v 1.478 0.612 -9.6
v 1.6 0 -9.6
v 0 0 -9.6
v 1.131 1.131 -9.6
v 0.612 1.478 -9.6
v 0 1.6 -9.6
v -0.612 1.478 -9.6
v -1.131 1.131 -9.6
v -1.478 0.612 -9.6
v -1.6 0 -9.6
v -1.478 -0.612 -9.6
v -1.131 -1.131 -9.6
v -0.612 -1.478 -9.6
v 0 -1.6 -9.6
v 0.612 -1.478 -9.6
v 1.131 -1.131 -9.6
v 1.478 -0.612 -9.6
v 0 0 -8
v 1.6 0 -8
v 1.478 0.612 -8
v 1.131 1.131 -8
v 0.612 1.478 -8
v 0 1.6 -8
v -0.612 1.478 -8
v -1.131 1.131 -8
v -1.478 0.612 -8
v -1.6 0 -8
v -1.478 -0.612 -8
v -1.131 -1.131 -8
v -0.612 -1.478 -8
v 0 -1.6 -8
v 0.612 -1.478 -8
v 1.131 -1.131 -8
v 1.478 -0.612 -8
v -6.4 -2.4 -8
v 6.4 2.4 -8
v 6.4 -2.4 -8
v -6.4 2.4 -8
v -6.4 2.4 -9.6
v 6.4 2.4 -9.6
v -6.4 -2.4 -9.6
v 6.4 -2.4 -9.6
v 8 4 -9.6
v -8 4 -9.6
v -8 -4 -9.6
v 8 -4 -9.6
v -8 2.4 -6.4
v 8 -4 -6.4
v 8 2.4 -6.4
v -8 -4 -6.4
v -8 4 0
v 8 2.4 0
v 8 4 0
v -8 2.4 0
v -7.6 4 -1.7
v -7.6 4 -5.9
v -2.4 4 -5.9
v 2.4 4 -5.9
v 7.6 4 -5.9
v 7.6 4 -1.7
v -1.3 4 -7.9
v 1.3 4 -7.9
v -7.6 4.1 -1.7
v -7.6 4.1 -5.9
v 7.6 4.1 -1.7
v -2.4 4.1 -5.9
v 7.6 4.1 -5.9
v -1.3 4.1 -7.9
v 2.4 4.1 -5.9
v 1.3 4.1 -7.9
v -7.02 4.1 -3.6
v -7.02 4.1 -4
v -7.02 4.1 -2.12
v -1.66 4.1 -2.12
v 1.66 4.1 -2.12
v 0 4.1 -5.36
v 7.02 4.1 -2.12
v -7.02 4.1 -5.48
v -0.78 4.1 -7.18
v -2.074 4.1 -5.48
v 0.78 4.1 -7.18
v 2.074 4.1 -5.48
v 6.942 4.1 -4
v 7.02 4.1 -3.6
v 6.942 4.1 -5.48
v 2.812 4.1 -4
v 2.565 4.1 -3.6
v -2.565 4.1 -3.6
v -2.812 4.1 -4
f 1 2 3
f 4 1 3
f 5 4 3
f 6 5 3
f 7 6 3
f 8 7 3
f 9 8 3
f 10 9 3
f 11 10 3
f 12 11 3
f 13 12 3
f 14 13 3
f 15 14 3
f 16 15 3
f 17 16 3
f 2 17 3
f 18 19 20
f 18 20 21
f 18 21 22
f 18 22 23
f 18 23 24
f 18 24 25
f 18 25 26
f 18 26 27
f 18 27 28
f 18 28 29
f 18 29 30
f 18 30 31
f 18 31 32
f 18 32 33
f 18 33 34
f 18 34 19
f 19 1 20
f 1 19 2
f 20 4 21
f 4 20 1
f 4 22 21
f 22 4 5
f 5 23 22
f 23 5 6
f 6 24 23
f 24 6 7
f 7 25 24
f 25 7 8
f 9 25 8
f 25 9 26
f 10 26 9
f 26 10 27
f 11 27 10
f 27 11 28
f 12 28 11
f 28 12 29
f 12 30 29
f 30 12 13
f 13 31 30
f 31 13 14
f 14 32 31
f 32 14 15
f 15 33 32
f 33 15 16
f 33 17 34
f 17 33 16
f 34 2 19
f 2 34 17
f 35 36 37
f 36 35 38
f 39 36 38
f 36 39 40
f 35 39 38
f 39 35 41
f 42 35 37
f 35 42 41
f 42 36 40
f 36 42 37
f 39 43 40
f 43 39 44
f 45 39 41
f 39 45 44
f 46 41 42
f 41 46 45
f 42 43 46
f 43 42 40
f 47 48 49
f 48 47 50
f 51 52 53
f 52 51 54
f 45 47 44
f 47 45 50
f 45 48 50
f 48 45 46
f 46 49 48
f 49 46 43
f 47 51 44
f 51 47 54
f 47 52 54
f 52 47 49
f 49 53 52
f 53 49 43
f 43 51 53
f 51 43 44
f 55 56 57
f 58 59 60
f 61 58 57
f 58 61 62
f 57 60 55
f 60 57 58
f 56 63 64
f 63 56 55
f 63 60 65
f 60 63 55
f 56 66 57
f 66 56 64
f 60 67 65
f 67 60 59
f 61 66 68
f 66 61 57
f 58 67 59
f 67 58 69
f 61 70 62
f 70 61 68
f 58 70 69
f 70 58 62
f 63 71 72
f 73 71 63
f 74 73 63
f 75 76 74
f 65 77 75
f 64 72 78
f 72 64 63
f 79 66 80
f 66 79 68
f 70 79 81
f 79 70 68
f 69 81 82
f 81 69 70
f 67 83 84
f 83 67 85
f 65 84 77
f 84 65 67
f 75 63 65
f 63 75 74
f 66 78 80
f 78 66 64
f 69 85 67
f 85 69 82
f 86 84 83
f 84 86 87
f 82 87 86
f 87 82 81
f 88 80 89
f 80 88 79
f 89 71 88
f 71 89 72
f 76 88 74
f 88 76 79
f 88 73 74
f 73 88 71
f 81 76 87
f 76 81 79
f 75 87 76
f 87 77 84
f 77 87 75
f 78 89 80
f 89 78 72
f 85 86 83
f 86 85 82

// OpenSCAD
// file: ../p/4-4edge.scad
use <../lib.scad>
function ldraw_lib__4_4edge() = [
// 0 Circle 1.0
// 0 Name: 4-4edge.dat
// 0 Author: James Jessiman
// 0 !LDRAW_ORG Primitive UPDATE 2017-01
// 0 !LICENSE Licensed under CC BY 2.0 and CC BY 4.0 : see CAreadme.txt
// 
// 0 BFC CERTIFY CCW
  [0,"BFC","CERTIFY"],
  [0,"BFC","CCW"],
// 
// 0 !HISTORY 1998-12-15 [PTadmin] Official Update 1998-10
// 0 !HISTORY 2005-12-28 [PTadmin] Official Update 2005-01
// 0 !HISTORY 2007-06-24 [PTadmin] Header formatted for Contributor Agreement
// 0 !HISTORY 2008-07-01 [PTadmin] Official Update 2008-01
// 0 !HISTORY 2017-01-15 [Steffen] BFCed
// 0 !HISTORY 2017-12-30 [PTadmin] Official Update 2017-01
// 
// 
// 2 24 1 0 0 0.9239 0 0.3827
  [2,24,1,0,0,0.9239,0,0.3827],
// 2 24 0.9239 0 0.3827 0.7071 0 0.7071
  [2,24,0.9239,0,0.3827,0.7071,0,0.7071],
// 2 24 0.7071 0 0.7071 0.3827 0 0.9239
  [2,24,0.7071,0,0.7071,0.3827,0,0.9239],
// 2 24 0.3827 0 0.9239 0 0 1
  [2,24,0.3827,0,0.9239,0,0,1],
// 2 24 0 0 1 -0.3827 0 0.9239
  [2,24,0,0,1,-0.3827,0,0.9239],
// 2 24 -0.3827 0 0.9239 -0.7071 0 0.7071
  [2,24,-0.3827,0,0.9239,-0.7071,0,0.7071],
// 2 24 -0.7071 0 0.7071 -0.9239 0 0.3827
  [2,24,-0.7071,0,0.7071,-0.9239,0,0.3827],
// 2 24 -0.9239 0 0.3827 -1 0 -0
  [2,24,-0.9239,0,0.3827,-1,0,-0],
// 2 24 -1 0 -0 -0.9239 0 -0.3827
  [2,24,-1,0,-0,-0.9239,0,-0.3827],
// 2 24 -0.9239 0 -0.3827 -0.7071 0 -0.7071
  [2,24,-0.9239,0,-0.3827,-0.7071,0,-0.7071],
// 2 24 -0.7071 0 -0.7071 -0.3827 0 -0.9239
  [2,24,-0.7071,0,-0.7071,-0.3827,0,-0.9239],
// 2 24 -0.3827 0 -0.9239 0 0 -1
  [2,24,-0.3827,0,-0.9239,0,0,-1],
// 2 24 0 0 -1 0.3827 0 -0.9239
  [2,24,0,0,-1,0.3827,0,-0.9239],
// 2 24 0.3827 0 -0.9239 0.7071 0 -0.7071
  [2,24,0.3827,0,-0.9239,0.7071,0,-0.7071],
// 2 24 0.7071 0 -0.7071 0.9239 0 -0.3827
  [2,24,0.7071,0,-0.7071,0.9239,0,-0.3827],
// 2 24 0.9239 0 -0.3827 1 0 0
  [2,24,0.9239,0,-0.3827,1,0,0],
];
module ldraw_lib__4_4edge(step=0, col=false, unit=2/5, alt=false, line=0.2, solid=!$preview)
    makepoly(ldraw_lib__4_4edge(), step=step, col=col, unit=unit, alt=alt, line=line, solid=solid);
ldraw_lib__4_4edge(line=0.2);
// file: ../p/4-4disc.scad
use <../lib.scad>
function ldraw_lib__4_4disc() = [
// 0 Disc 1.0
// 0 Name: 4-4disc.dat
// 0 Author: James Jessiman
// 0 !LDRAW_ORG Primitive UPDATE 2002-02
// 0 !LICENSE Licensed under CC BY 2.0 and CC BY 4.0 : see CAreadme.txt
// 
// 0 BFC CERTIFY CCW
  [0,"BFC","CERTIFY"],
  [0,"BFC","CCW"],
// 
// 0 !HISTORY 1998-12-15 [PTadmin] Official Update 1998-10
// 0 !HISTORY 2002-03-23 [sbliss] Added BFC statement
// 0 !HISTORY 2002-04-25 [PTadmin] Official Update 2002-02
// 0 !HISTORY 2007-06-24 [PTadmin] Header formatted for Contributor Agreement
// 0 !HISTORY 2008-07-01 [PTadmin] Official Update 2008-01
// 
// 
// 3 16 0 0 0 1 0 0 0.9239 0 0.3827
  [3,16,0,0,0,1,0,0,0.9239,0,0.3827],
// 3 16 0 0 0 0.9239 0 0.3827 0.7071 0 0.7071
  [3,16,0,0,0,0.9239,0,0.3827,0.7071,0,0.7071],
// 3 16 0 0 0 0.7071 0 0.7071 0.3827 0 0.9239
  [3,16,0,0,0,0.7071,0,0.7071,0.3827,0,0.9239],
// 3 16 0 0 0 0.3827 0 0.9239 0 0 1
  [3,16,0,0,0,0.3827,0,0.9239,0,0,1],
// 3 16 0 0 0 0 0 1 -0.3827 0 0.9239
  [3,16,0,0,0,0,0,1,-0.3827,0,0.9239],
// 3 16 0 0 0 -0.3827 0 0.9239 -0.7071 0 0.7071
  [3,16,0,0,0,-0.3827,0,0.9239,-0.7071,0,0.7071],
// 3 16 0 0 0 -0.7071 0 0.7071 -0.9239 0 0.3827
  [3,16,0,0,0,-0.7071,0,0.7071,-0.9239,0,0.3827],
// 3 16 0 0 0 -0.9239 0 0.3827 -1 0 -0
  [3,16,0,0,0,-0.9239,0,0.3827,-1,0,-0],
// 3 16 0 0 0 -1 0 -0 -0.9239 0 -0.3827
  [3,16,0,0,0,-1,0,-0,-0.9239,0,-0.3827],
// 3 16 0 0 0 -0.9239 0 -0.3827 -0.7071 0 -0.7071
  [3,16,0,0,0,-0.9239,0,-0.3827,-0.7071,0,-0.7071],
// 3 16 0 0 0 -0.7071 0 -0.7071 -0.3827 0 -0.9239
  [3,16,0,0,0,-0.7071,0,-0.7071,-0.3827,0,-0.9239],
// 3 16 0 0 0 -0.3827 0 -0.9239 0 0 -1
  [3,16,0,0,0,-0.3827,0,-0.9239,0,0,-1],
// 3 16 0 0 0 0 0 -1 0.3827 0 -0.9239
  [3,16,0,0,0,0,0,-1,0.3827,0,-0.9239],
// 3 16 0 0 0 0.3827 0 -0.9239 0.7071 0 -0.7071
  [3,16,0,0,0,0.3827,0,-0.9239,0.7071,0,-0.7071],
// 3 16 0 0 0 0.7071 0 -0.7071 0.9239 0 -0.3827
  [3,16,0,0,0,0.7071,0,-0.7071,0.9239,0,-0.3827],
// 3 16 0 0 0 0.9239 0 -0.3827 1 0 0
  [3,16,0,0,0,0.9239,0,-0.3827,1,0,0],
// 0
];
module ldraw_lib__4_4disc(step=0, col=false, unit=2/5, alt=false, line=0.2, solid=!$preview)
    makepoly(ldraw_lib__4_4disc(), step=step, col=col, unit=unit, alt=alt, line=line, solid=solid);
ldraw_lib__4_4disc(line=0.2);
// file: ../p/4-4cyli.scad
use <../lib.scad>
$fa=1; $fs=0.2;
function ldraw_lib__4_4cyli(realsolid=false) = [
// 0 Cylinder 1.0
// 0 Name: 4-4cyli.dat
// 0 Author: James Jessiman
// 0 !LDRAW_ORG Primitive UPDATE 2005-01
// 0 !LICENSE Licensed under CC BY 2.0 and CC BY 4.0 : see CAreadme.txt
// 
// 0 BFC CERTIFY CCW
  [0,"BFC","CERTIFY"],
  [0,"BFC","CCW"],
// 
// 0 !HISTORY 1998-12-15 [PTadmin] Official Update 1998-10
// 0 !HISTORY 2002-03-23 [sbliss] Added BFC statement; merged headers from files in distributions LDraw 0.27 and Complete.
// 0 !HISTORY 2002-04-25 [PTadmin] Official Update 2002-02
// 0 !HISTORY 2004-12-14 [guyvivan] BFC CCW
// 0 !HISTORY 2005-12-28 [PTadmin] Official Update 2005-01
// 0 !HISTORY 2007-06-24 [PTadmin] Header formatted for Contributor Agreement
// 0 !HISTORY 2008-07-01 [PTadmin] Official Update 2008-01
// 
// 
// 4 16 1 1 0 0.9239 1 0.3827 0.9239 0 0.3827 1 0 0
  [4,16,1,1,0,0.9239,1,0.3827,0.9239,0,0.3827,1,0,0],
// 5 24 1 0 0 1 1 0 0.9239 0 0.3827 0.9239 0 -0.3827
  [5,24,1,0,0,1,1,0,0.9239,0,0.3827,0.9239,0,-0.3827],
// 4 16 0.9239 1 0.3827 0.7071 1 0.7071 0.7071 0 0.7071 0.9239 0 0.3827
  [4,16,0.9239,1,0.3827,0.7071,1,0.7071,0.7071,0,0.7071,0.9239,0,0.3827],
// 5 24 0.9239 0 0.3827 0.9239 1 0.3827 0.7071 0 0.7071 1 0 0
  [5,24,0.9239,0,0.3827,0.9239,1,0.3827,0.7071,0,0.7071,1,0,0],
// 4 16 0.7071 1 0.7071 0.3827 1 0.9239 0.3827 0 0.9239 0.7071 0 0.7071
  [4,16,0.7071,1,0.7071,0.3827,1,0.9239,0.3827,0,0.9239,0.7071,0,0.7071],
// 5 24 0.7071 0 0.7071 0.7071 1 0.7071 0.3827 0 0.9239 0.9239 0 0.3827
  [5,24,0.7071,0,0.7071,0.7071,1,0.7071,0.3827,0,0.9239,0.9239,0,0.3827],
// 4 16 0.3827 1 0.9239 0 1 1 0 0 1 0.3827 0 0.9239
  [4,16,0.3827,1,0.9239,0,1,1,0,0,1,0.3827,0,0.9239],
// 5 24 0.3827 0 0.9239 0.3827 1 0.9239 0 0 1 0.7071 0 0.7071
  [5,24,0.3827,0,0.9239,0.3827,1,0.9239,0,0,1,0.7071,0,0.7071],
// 4 16 0 1 1 -0.3827 1 0.9239 -0.3827 0 0.9239 0 0 1
  [4,16,0,1,1,-0.3827,1,0.9239,-0.3827,0,0.9239,0,0,1],
// 5 24 0 0 1 0 1 1 -0.3827 0 0.9239 0.3827 0 0.9239
  [5,24,0,0,1,0,1,1,-0.3827,0,0.9239,0.3827,0,0.9239],
// 4 16 -0.3827 1 0.9239 -0.7071 1 0.7071 -0.7071 0 0.7071 -0.3827 0 0.9239
  [4,16,-0.3827,1,0.9239,-0.7071,1,0.7071,-0.7071,0,0.7071,-0.3827,0,0.9239],
// 5 24 -0.3827 0 0.9239 -0.3827 1 0.9239 -0.7071 0 0.7071 0 0 1
  [5,24,-0.3827,0,0.9239,-0.3827,1,0.9239,-0.7071,0,0.7071,0,0,1],
// 4 16 -0.7071 1 0.7071 -0.9239 1 0.3827 -0.9239 0 0.3827 -0.7071 0 0.7071
  [4,16,-0.7071,1,0.7071,-0.9239,1,0.3827,-0.9239,0,0.3827,-0.7071,0,0.7071],
// 5 24 -0.7071 0 0.7071 -0.7071 1 0.7071 -0.9239 0 0.3827 -0.3827 0 0.9239
  [5,24,-0.7071,0,0.7071,-0.7071,1,0.7071,-0.9239,0,0.3827,-0.3827,0,0.9239],
// 4 16 -0.9239 1 0.3827 -1 1 0 -1 0 0 -0.9239 0 0.3827
  [4,16,-0.9239,1,0.3827,-1,1,0,-1,0,0,-0.9239,0,0.3827],
// 5 24 -0.9239 0 0.3827 -0.9239 1 0.3827 -1 0 0 -0.7071 0 0.7071
  [5,24,-0.9239,0,0.3827,-0.9239,1,0.3827,-1,0,0,-0.7071,0,0.7071],
// 4 16 -1 1 0 -0.9239 1 -0.3827 -0.9239 0 -0.3827 -1 0 0
  [4,16,-1,1,0,-0.9239,1,-0.3827,-0.9239,0,-0.3827,-1,0,0],
// 5 24 -1 0 0 -1 1 0 -0.9239 0 -0.3827 -0.9239 0 0.3827
  [5,24,-1,0,0,-1,1,0,-0.9239,0,-0.3827,-0.9239,0,0.3827],
// 4 16 -0.9239 1 -0.3827 -0.7071 1 -0.7071 -0.7071 0 -0.7071 -0.9239 0 -0.3827
  [4,16,-0.9239,1,-0.3827,-0.7071,1,-0.7071,-0.7071,0,-0.7071,-0.9239,0,-0.3827],
// 5 24 -0.9239 0 -0.3827 -0.9239 1 -0.3827 -0.7071 0 -0.7071 -1 0 0
  [5,24,-0.9239,0,-0.3827,-0.9239,1,-0.3827,-0.7071,0,-0.7071,-1,0,0],
// 4 16 -0.7071 1 -0.7071 -0.3827 1 -0.9239 -0.3827 0 -0.9239 -0.7071 0 -0.7071
  [4,16,-0.7071,1,-0.7071,-0.3827,1,-0.9239,-0.3827,0,-0.9239,-0.7071,0,-0.7071],
// 5 24 -0.7071 0 -0.7071 -0.7071 1 -0.7071 -0.3827 0 -0.9239 -0.9239 0 -0.3827
  [5,24,-0.7071,0,-0.7071,-0.7071,1,-0.7071,-0.3827,0,-0.9239,-0.9239,0,-0.3827],
// 4 16 -0.3827 1 -0.9239 0 1 -1 0 0 -1 -0.3827 0 -0.9239
  [4,16,-0.3827,1,-0.9239,0,1,-1,0,0,-1,-0.3827,0,-0.9239],
// 5 24 -0.3827 0 -0.9239 -0.3827 1 -0.9239 0 0 -1 -0.7071 0 -0.7071
  [5,24,-0.3827,0,-0.9239,-0.3827,1,-0.9239,0,0,-1,-0.7071,0,-0.7071],
// 4 16 0 1 -1 0.3827 1 -0.9239 0.3827 0 -0.9239 0 0 -1
  [4,16,0,1,-1,0.3827,1,-0.9239,0.3827,0,-0.9239,0,0,-1],
// 5 24 0 0 -1 0 1 -1 0.3827 0 -0.9239 -0.3827 0 -0.9239
  [5,24,0,0,-1,0,1,-1,0.3827,0,-0.9239,-0.3827,0,-0.9239],
// 4 16 0.3827 1 -0.9239 0.7071 1 -0.7071 0.7071 0 -0.7071 0.3827 0 -0.9239
  [4,16,0.3827,1,-0.9239,0.7071,1,-0.7071,0.7071,0,-0.7071,0.3827,0,-0.9239],
// 5 24 0.3827 0 -0.9239 0.3827 1 -0.9239 0.7071 0 -0.7071 0 0 -1
  [5,24,0.3827,0,-0.9239,0.3827,1,-0.9239,0.7071,0,-0.7071,0,0,-1],
// 4 16 0.7071 1 -0.7071 0.9239 1 -0.3827 0.9239 0 -0.3827 0.7071 0 -0.7071
  [4,16,0.7071,1,-0.7071,0.9239,1,-0.3827,0.9239,0,-0.3827,0.7071,0,-0.7071],
// 5 24 0.7071 0 -0.7071 0.7071 1 -0.7071 0.9239 0 -0.3827 0.3827 0 -0.9239
  [5,24,0.7071,0,-0.7071,0.7071,1,-0.7071,0.9239,0,-0.3827,0.3827,0,-0.9239],
// 4 16 0.9239 1 -0.3827 1 1 0 1 0 0 0.9239 0 -0.3827
  [4,16,0.9239,1,-0.3827,1,1,0,1,0,0,0.9239,0,-0.3827],
// 5 24 0.9239 0 -0.3827 0.9239 1 -0.3827 1 0 0 0.7071 0 -0.7071
  [5,24,0.9239,0,-0.3827,0.9239,1,-0.3827,1,0,0,0.7071,0,-0.7071],
// 0
];
module ldraw_lib__4_4cyli(step=0, col=false, unit=2/5, alt=false, line=0.2, solid=!$preview)
    makepoly(ldraw_lib__4_4cyli(solid), step=step, col=col, unit=unit, alt=alt, line=line, solid=solid);
ldraw_lib__4_4cyli(line=0.2);
// file: ../p/stud3.scad
use <../lib.scad>
use <4-4cyli.scad>
use <4-4disc.scad>
use <4-4edge.scad>
function ldraw_lib__stud3() = [
// 0 Stud Tube Solid
// 0 Name: stud3.dat
// 0 Author: James Jessiman
// 0 !LDRAW_ORG Primitive UPDATE 2012-01
// 0 !LICENSE Licensed under CC BY 4.0 : see CAreadme.txt
// 
// 0 BFC CERTIFY CCW
  [0,"BFC","CERTIFY"],
  [0,"BFC","CCW"],
// 
// 0 !HISTORY 2002-04-04 [sbliss] Modified for BFC compliance
// 0 !HISTORY 2002-04-25 [PTadmin] Official Update 2002-02
// 0 !HISTORY 2007-06-24 [PTadmin] Header formatted for Contributor Agreement
// 0 !HISTORY 2008-07-01 [PTadmin] Official Update 2008-01
// 0 !HISTORY 2012-02-16 [Philo] Changed to CCW
// 0 !HISTORY 2012-03-30 [PTadmin] Official Update 2012-01
// 
// 
// 1 16 0 -4 0 4 0 0 0 1 0 0 0 4 4-4edge.dat
  [1,16,0,-4,0,4,0,0,0,1,0,0,0,4, ldraw_lib__4_4edge()],
// 1 16 0 0 0 4 0 0 0 1 0 0 0 4 4-4edge.dat
  [1,16,0,0,0,4,0,0,0,1,0,0,0,4, ldraw_lib__4_4edge()],
// 1 16 0 -4 0 4 0 0 0 1 0 0 0 4 4-4disc.dat
  [1,16,0,-4,0,4,0,0,0,1,0,0,0,4, ldraw_lib__4_4disc()],
  [-1,16,0,0,0,4,0,0,0,-1,0,0,0,4, ldraw_lib__4_4disc()],
// 1 16 0 -4 0 4 0 0 0 4 0 0 0 4 4-4cyli.dat
  [1,16,0,-4,0,4,0,0,0,4,0,0,0,4, ldraw_lib__4_4cyli()],
];
module ldraw_lib__stud3(step=0, col=false, unit=2/5, alt=false, line=0.2, solid=!$preview)
    makepoly(ldraw_lib__stud3(), step=step, col=col, unit=unit, alt=alt, line=line, solid=solid);
ldraw_lib__stud3(line=0.2);
// file: ../p/box5.scad
use <../lib.scad>
function ldraw_lib__box5() = [
// 0 Box with 5 Faces and All Edges
// 0 Name: box5.dat
// 0 Author: James Jessiman
// 0 !LDRAW_ORG Primitive UPDATE 2012-01
// 0 !LICENSE Licensed under CC BY 2.0 and CC BY 4.0 : see CAreadme.txt
// 
// 0 BFC CERTIFY CCW
  [0,"BFC","CERTIFY"],
  [0,"BFC","CCW"],
// 
// 0 !HISTORY 2002-04-03 [sbliss] Modified for BFC compliance
// 0 !HISTORY 2002-04-25 [PTadmin] Official Update 2002-02
// 0 !HISTORY 2007-06-24 [PTadmin] Header formatted for Contributor Agreement
// 0 !HISTORY 2008-07-01 [PTadmin] Official Update 2008-01
// 0 !HISTORY 2012-02-16 [Philo] Changed to CCW
// 0 !HISTORY 2012-03-30 [PTadmin] Official Update 2012-01
// 
// 
// 2 24 1 1 1 -1 1 1
  [2,24,1,1,1,-1,1,1],
// 2 24 -1 1 1 -1 1 -1
  [2,24,-1,1,1,-1,1,-1],
// 2 24 -1 1 -1 1 1 -1
  [2,24,-1,1,-1,1,1,-1],
// 2 24 1 1 -1 1 1 1
  [2,24,1,1,-1,1,1,1],
// 2 24 1 0 1 -1 0 1
  [2,24,1,0,1,-1,0,1],
// 2 24 -1 0 1 -1 0 -1
  [2,24,-1,0,1,-1,0,-1],
// 2 24 -1 0 -1 1 0 -1
  [2,24,-1,0,-1,1,0,-1],
// 2 24 1 0 -1 1 0 1
  [2,24,1,0,-1,1,0,1],
// 2 24 1 0 1 1 1 1
  [2,24,1,0,1,1,1,1],
// 2 24 -1 0 1 -1 1 1
  [2,24,-1,0,1,-1,1,1],
// 2 24 1 0 -1 1 1 -1
  [2,24,1,0,-1,1,1,-1],
// 2 24 -1 0 -1 -1 1 -1
  [2,24,-1,0,-1,-1,1,-1],
// 4 16 -1 1 1 1 1 1 1 1 -1 -1 1 -1
  [4,16,-1,1,1,1,1,1,1,1,-1,-1,1,-1],
// 4 16 -1 1 1 -1 0 1 1 0 1 1 1 1
  [4,16,-1,1,1,-1,0,1,1,0,1,1,1,1],
// 4 16 -1 1 -1 -1 0 -1 -1 0 1 -1 1 1
  [4,16,-1,1,-1,-1,0,-1,-1,0,1,-1,1,1],
// 4 16 1 1 -1 1 0 -1 -1 0 -1 -1 1 -1
  [4,16,1,1,-1,1,0,-1,-1,0,-1,-1,1,-1],
// 4 16 1 1 1 1 0 1 1 0 -1 1 1 -1
  [4,16,1,1,1,1,0,1,1,0,-1,1,1,-1],
];
makepoly(ldraw_lib__box5(), line=0.2);
// file: s/4865as01.scad
use <../../lib.scad>
use <../../p/box5.scad>
use <../../p/stud3.scad>
function ldraw_lib__s__4865as01() = [
// 0 ~Panel  1 x  2 x  1 without Front Face
// 0 Name: s\4865as01.dat
// 0 Author: James Jessiman
// 0 !LDRAW_ORG Subpart UPDATE 2020-03
// 0 !LICENSE Licensed under CC BY 2.0 and CC BY 4.0 : see CAreadme.txt
// 
// 0 BFC CERTIFY CCW
  [0,"BFC","CERTIFY"],
  [0,"BFC","CCW"],
// 
// 0 !HISTORY 2003-07-03 [Steffen] BFCed, subfiled
// 0 !HISTORY 2004-04-22 [PTadmin] Official Update 2004-02
// 0 !HISTORY 2007-09-10 [PTadmin] Header formatted for Contributor Agreement
// 0 !HISTORY 2008-07-01 [PTadmin] Official Update 2008-01
// 0 !HISTORY 2020-07-14 [PTadmin] Renamed from s/4865s01
// 0 !HISTORY 2020-12-29 [PTadmin] Official Update 2020-03
// 
// 
// 1 16 0 20 0 1 0 0 0 -1 0 0 0 1 stud3.dat
  [1,16,0,20,0,1,0,0,0,-1,0,0,0,1, ldraw_lib__stud3()],
// 0 BFC INVERTNEXT
  [0,"BFC","INVERTNEXT"],
// 1 16 0 24 0 16 0 0 0 -4 0 0 0 6 box5.dat
  [1,16,0,24,0,16,0,0,0,-4,0,0,0,6, ldraw_lib__box5()],
// 4 16 20 24 10 16 24 6 -16 24 6 -20 24 10
  [4,16,20,24,10,16,24,6,-16,24,6,-20,24,10],
// 4 16 -20 24 10 -16 24 6 -16 24 -6 -20 24 -10
  [4,16,-20,24,10,-16,24,6,-16,24,-6,-20,24,-10],
// 4 16 -20 24 -10 -16 24 -6 16 24 -6 20 24 -10
  [4,16,-20,24,-10,-16,24,-6,16,24,-6,20,24,-10],
// 4 16 20 24 -10 16 24 -6 16 24 6 20 24 10
  [4,16,20,24,-10,16,24,-6,16,24,6,20,24,10],
// 2 24 20 24 10 -20 24 10
  [2,24,20,24,10,-20,24,10],
// 2 24 -20 24 10 -20 24 -10
  [2,24,-20,24,10,-20,24,-10],
// 2 24 -20 24 -10 20 24 -10
  [2,24,-20,24,-10,20,24,-10],
// 2 24 20 24 -10 20 24 10
  [2,24,20,24,-10,20,24,10],
// 2 24 20 16 6 -20 16 6
  [2,24,20,16,6,-20,16,6],
// 2 24 -20 16 6 -20 16 -10
  [2,24,-20,16,6,-20,16,-10],
// 2 24 -20 16 -10 20 16 -10
  [2,24,-20,16,-10,20,16,-10],
// 2 24 20 16 -10 20 16 6
  [2,24,20,16,-10,20,16,6],
// 2 24 20 0 10 -20 0 10
  [2,24,20,0,10,-20,0,10],
// 2 24 -20 0 10 -20 0 6
  [2,24,-20,0,10,-20,0,6],
// 2 24 -20 0 6 20 0 6
  [2,24,-20,0,6,20,0,6],
// 2 24 20 0 6 20 0 10
  [2,24,20,0,6,20,0,10],
// 2 24 20 0 6 20 16 6
  [2,24,20,0,6,20,16,6],
// 2 24 -20 0 6 -20 16 6
  [2,24,-20,0,6,-20,16,6],
// 2 24 20 16 -10 20 24 -10
  [2,24,20,16,-10,20,24,-10],
// 2 24 -20 16 -10 -20 24 -10
  [2,24,-20,16,-10,-20,24,-10],
// 2 24 20 0 10 20 24 10
  [2,24,20,0,10,20,24,10],
// 2 24 -20 0 10 -20 24 10
  [2,24,-20,0,10,-20,24,10],
// 4 16 20 16 -10 20 16 6 -20 16 6 -20 16 -10
  [4,16,20,16,-10,20,16,6,-20,16,6,-20,16,-10],
// 4 16 20 0 6 20 0 10 -20 0 10 -20 0 6
  [4,16,20,0,6,20,0,10,-20,0,10,-20,0,6],
// 4 16 -20 24 10 -20 24 -10 -20 16 -10 -20 16 6
  [4,16,-20,24,10,-20,24,-10,-20,16,-10,-20,16,6],
// 4 16 -20 24 -10 20 24 -10 20 16 -10 -20 16 -10
  [4,16,-20,24,-10,20,24,-10,20,16,-10,-20,16,-10],
// 4 16 20 24 -10 20 24 10 20 16 6 20 16 -10
  [4,16,20,24,-10,20,24,10,20,16,6,20,16,-10],
// 4 16 -20 24 10 -20 16 6 -20 0 6 -20 0 10
  [4,16,-20,24,10,-20,16,6,-20,0,6,-20,0,10],
// 4 16 -20 16 6 20 16 6 20 0 6 -20 0 6
  [4,16,-20,16,6,20,16,6,20,0,6,-20,0,6],
// 4 16 20 16 6 20 24 10 20 0 10 20 0 6
  [4,16,20,16,6,20,24,10,20,0,10,20,0,6],
// 0
];
makepoly(ldraw_lib__s__4865as01(), line=0.2);
// file: 4865a.scad
use <../lib.scad>
use <s/4865as01.scad>
function ldraw_lib__4865a() = [
// 0 Panel  1 x  2 x  1 with Square Corners
// 0 Name: 4865a.dat
// 0 Author: James Jessiman
// 0 !LDRAW_ORG Part UPDATE 2020-03
// 0 !LICENSE Licensed under CC BY 2.0 and CC BY 4.0 : see CAreadme.txt
// 
// 0 BFC CERTIFY CCW
  [0,"BFC","CERTIFY"],
  [0,"BFC","CCW"],
// 
// 0 !HISTORY 2003-07-03 [Steffen] BFCed, subfiled
// 0 !HISTORY 2004-04-22 [PTadmin] Official Update 2004-02
// 0 !HISTORY 2007-07-09 [PTadmin] Header formatted for Contributor Agreement
// 0 !HISTORY 2008-07-01 [PTadmin] Official Update 2008-01
// 0 !HISTORY 2011-12-08 [PTadmin] Renamed from 4865
// 0 !HISTORY 2011-12-29 [PTadmin] Official Update 2011-02
// 0 !HISTORY 2020-08-01 [cwdee] Use renamed subfile
// 0 !HISTORY 2020-12-29 [PTadmin] Official Update 2020-03
// 
// 
// 1 16 0 0 0 1 0 0 0 1 0 0 0 1 s\4865as01.dat
  [1,16,0,0,0,1,0,0,0,1,0,0,0,1, ldraw_lib__s__4865as01()],
// 4 16 20 24 10 -20 24 10 -20 0 10 20 0 10
  [4,16,20,24,10,-20,24,10,-20,0,10,20,0,10],
// 
];
module ldraw_lib__4865a(step=0, col=false, unit=2/5, alt=false, line=0.2, solid=!$preview)
    makepoly(ldraw_lib__4865a(), step=step, col=col, unit=unit, alt=alt, line=line, solid=solid);
ldraw_lib__4865a(line=0.2);
// file: 169635a.scad
use <../lib.scad>
function ldraw_lib__169635a() = [
// 0 Sticker  0.8 x  1.9 with Blue V and Red Lines on Transparent Background
// 0 Name: 169635a.dat
// 0 Author: Chris Böhnke [KnightOfTarenta]
// 0 !LDRAW_ORG Part UPDATE 2025-04
// 0 !LICENSE Licensed under CC BY 4.0 : see CAreadme.txt
// 
// 0 BFC CERTIFY CCW
  [0,"BFC","CERTIFY"],
  [0,"BFC","CCW"],
// 
// 0 !KEYWORDS Bricklink 6614stk01, Launch Command, Launch Evac 1
// 0 !KEYWORDS Rebrickable 169635, Set 6614, space port, town
// 
// 0 !HISTORY 2025-04-27 [OrionP] Official Update 2025-04
// 
// 0 // Sticker Back
// 3 16 -6 0 -2.75 -19 0 -2.75 -19 0 7.75
  [3,16,-6,0,-2.75,-19,0,-2.75,-19,0,7.75],
// 3 16 19 0 7.75 19 0 -2.75 6 0 -2.75
  [3,16,19,0,7.75,19,0,-2.75,6,0,-2.75],
// 4 16 3.25 0 -7.75 -3.25 0 -7.75 -6 0 -2.75 6 0 -2.75
  [4,16,3.25,0,-7.75,-3.25,0,-7.75,-6,0,-2.75,6,0,-2.75],
// 4 16 -6 0 -2.75 -19 0 7.75 19 0 7.75 6 0 -2.75
  [4,16,-6,0,-2.75,-19,0,7.75,19,0,7.75,6,0,-2.75],
// 
// 0 // Sticker Borders
// 4 16 -19 -.25 7.75 -19 0 7.75 -19 0 -2.75 -19 -.25 -2.75
  [4,16,-19,-.25,7.75,-19,0,7.75,-19,0,-2.75,-19,-.25,-2.75],
// 4 16 -19 0 7.75 -19 -.25 7.75 19 -.25 7.75 19 0 7.75
  [4,16,-19,0,7.75,-19,-.25,7.75,19,-.25,7.75,19,0,7.75],
// 4 16 -6 0 -2.75 -6 -.25 -2.75 -19 -.25 -2.75 -19 0 -2.75
  [4,16,-6,0,-2.75,-6,-.25,-2.75,-19,-.25,-2.75,-19,0,-2.75],
// 4 16 19 0 7.75 19 -.25 7.75 19 -.25 -2.75 19 0 -2.75
  [4,16,19,0,7.75,19,-.25,7.75,19,-.25,-2.75,19,0,-2.75],
// 4 16 -6 -.25 -2.75 -6 0 -2.75 -3.25 0 -7.75 -3.25 -.25 -7.75
  [4,16,-6,-.25,-2.75,-6,0,-2.75,-3.25,0,-7.75,-3.25,-.25,-7.75],
// 4 16 19 0 -2.75 19 -.25 -2.75 6 -.25 -2.75 6 0 -2.75
  [4,16,19,0,-2.75,19,-.25,-2.75,6,-.25,-2.75,6,0,-2.75],
// 4 16 -3.25 -.25 -7.75 -3.25 0 -7.75 3.25 0 -7.75 3.25 -.25 -7.75
  [4,16,-3.25,-.25,-7.75,-3.25,0,-7.75,3.25,0,-7.75,3.25,-.25,-7.75],
// 4 16 6 0 -2.75 6 -.25 -2.75 3.25 -.25 -7.75 3.25 0 -7.75
  [4,16,6,0,-2.75,6,-.25,-2.75,3.25,-.25,-7.75,3.25,0,-7.75],
// 
// 0 // Pattern
// 0 // Colour 16 Main Colour
// 3 16 -17.55 -.25 2 -17.55 -.25 3 -19 -.25 7.75
  [3,16,-17.55,-.25,2,-17.55,-.25,3,-19,-.25,7.75],
// 3 16 -19 -.25 7.75 -17.55 -.25 3 -17.55 -.25 6.7
  [3,16,-19,-.25,7.75,-17.55,-.25,3,-17.55,-.25,6.7],
// 3 16 -19 -.25 7.75 -17.55 -.25 6.7 -4.15 -.25 6.7
  [3,16,-19,-.25,7.75,-17.55,-.25,6.7,-4.15,-.25,6.7],
// 3 16 -4.15 -.25 6.7 0 -.25 -1.4 4.15 -.25 6.7
  [3,16,-4.15,-.25,6.7,0,-.25,-1.4,4.15,-.25,6.7],
// 3 16 4.15 -.25 6.7 17.55 -.25 6.7 19 -.25 7.75
  [3,16,4.15,-.25,6.7,17.55,-.25,6.7,19,-.25,7.75],
// 4 16 -19 -.25 7.75 -19 -.25 -2.75 -17.55 -.25 -1.7 -17.55 -.25 2
  [4,16,-19,-.25,7.75,-19,-.25,-2.75,-17.55,-.25,-1.7,-17.55,-.25,2],
// 4 16 -5.186 -.25 -1.7 -6 -.25 -2.75 -3.25 -.25 -7.75 -1.95 -.25 -5.95
  [4,16,-5.186,-.25,-1.7,-6,-.25,-2.75,-3.25,-.25,-7.75,-1.95,-.25,-5.95],
// 4 16 3.25 -.25 -7.75 1.95 -.25 -5.95 -1.95 -.25 -5.95 -3.25 -.25 -7.75
  [4,16,3.25,-.25,-7.75,1.95,-.25,-5.95,-1.95,-.25,-5.95,-3.25,-.25,-7.75],
// 4 16 3.25 -.25 -7.75 6 -.25 -2.75 5.186 -.25 -1.7 1.95 -.25 -5.95
  [4,16,3.25,-.25,-7.75,6,-.25,-2.75,5.186,-.25,-1.7,1.95,-.25,-5.95],
// 4 16 17.55 -.25 3 17.356 -.25 2 17.356 -.25 -1.7 19 -.25 -2.75
  [4,16,17.55,-.25,3,17.356,-.25,2,17.356,-.25,-1.7,19,-.25,-2.75],
// 4 16 17.55 -.25 6.7 17.55 -.25 3 19 -.25 -2.75 19 -.25 7.75
  [4,16,17.55,-.25,6.7,17.55,-.25,3,19,-.25,-2.75,19,-.25,7.75],
// 4 16 -19 -.25 7.75 -4.15 -.25 6.7 4.15 -.25 6.7 19 -.25 7.75
  [4,16,-19,-.25,7.75,-4.15,-.25,6.7,4.15,-.25,6.7,19,-.25,7.75],
// 4 16 -19 -.25 -2.75 -6 -.25 -2.75 -5.186 -.25 -1.7 -17.55 -.25 -1.7
  [4,16,-19,-.25,-2.75,-6,-.25,-2.75,-5.186,-.25,-1.7,-17.55,-.25,-1.7],
// 4 16 19 -.25 -2.75 17.356 -.25 -1.7 5.186 -.25 -1.7 6 -.25 -2.75
  [4,16,19,-.25,-2.75,17.356,-.25,-1.7,5.186,-.25,-1.7,6,-.25,-2.75],
// 4 16 17.356 -.25 2 17.55 -.25 3 6.412 -.25 3 7.031 -.25 2
  [4,16,17.356,-.25,2,17.55,-.25,3,6.412,-.25,3,7.031,-.25,2],
// 4 16 7.031 -.25 2 6.412 -.25 3 1.95 -.25 -5.95 5.186 -.25 -1.7
  [4,16,7.031,-.25,2,6.412,-.25,3,1.95,-.25,-5.95,5.186,-.25,-1.7],
// 4 16 -7.031 -.25 2 -5.186 -.25 -1.7 -1.95 -.25 -5.95 -6.412 -.25 3
  [4,16,-7.031,-.25,2,-5.186,-.25,-1.7,-1.95,-.25,-5.95,-6.412,-.25,3],
// 4 16 -17.55 -.25 2 -7.031 -.25 2 -6.412 -.25 3 -17.55 -.25 3
  [4,16,-17.55,-.25,2,-7.031,-.25,2,-6.412,-.25,3,-17.55,-.25,3],
// 
// 0 BFC NOCLIP
  [0,"BFC","NOCLIP"],
// 0 // Colour 1 Blue
// 4 1 -1.95 -.25 -5.95 0 -.25 -1.4 -4.15 -.25 6.7 -6.412 -.25 3
  [4,1,-1.95,-.25,-5.95,0,-.25,-1.4,-4.15,-.25,6.7,-6.412,-.25,3],
// 4 1 -17.55 -.25 3 -6.412 -.25 3 -4.15 -.25 6.7 -17.55 -.25 6.7
  [4,1,-17.55,-.25,3,-6.412,-.25,3,-4.15,-.25,6.7,-17.55,-.25,6.7],
// 4 1 -1.95 -.25 -5.95 1.95 -.25 -5.95 6.412 -.25 3 0 -.25 -1.4
  [4,1,-1.95,-.25,-5.95,1.95,-.25,-5.95,6.412,-.25,3,0,-.25,-1.4],
// 3 1 0 -.25 -1.4 6.412 -.25 3 4.15 -.25 6.7
  [3,1,0,-.25,-1.4,6.412,-.25,3,4.15,-.25,6.7],
// 4 1 17.55 -.25 3 17.55 -.25 6.7 4.15 -.25 6.7 6.412 -.25 3
  [4,1,17.55,-.25,3,17.55,-.25,6.7,4.15,-.25,6.7,6.412,-.25,3],
// 
// 0 // Colour 4 Red
// 4 4 -5.186 -.25 -1.7 -7.031 -.25 2 -17.55 -.25 2 -17.55 -.25 -1.7
  [4,4,-5.186,-.25,-1.7,-7.031,-.25,2,-17.55,-.25,2,-17.55,-.25,-1.7],
// 4 4 5.186 -.25 -1.7 17.356 -.25 -1.7 17.356 -.25 2 7.031 -.25 2
  [4,4,5.186,-.25,-1.7,17.356,-.25,-1.7,17.356,-.25,2,7.031,-.25,2],
];
module ldraw_lib__169635a(step=0, col=false, unit=2/5, alt=false, line=0.2, solid=!$preview)
    makepoly(ldraw_lib__169635a(), step=step, col=col, unit=unit, alt=alt, line=line, solid=solid);
ldraw_lib__169635a(line=0.2);
// main file
use <../lib.scad>
use <169635a.scad>
use <4865a.scad>
function ldraw_lib__4865ad0d() = [
// 0 Panel  1 x  2 x  1 with Blue V and Red Lines on Transparent Background Sticker
// 0 Name: 4865ad0d.dat
// 0 Author: Chris Böhnke [KnightOfTarenta]
// 0 !LDRAW_ORG Shortcut UPDATE 2025-04
// 0 !LICENSE Licensed under CC BY 4.0 : see CAreadme.txt
// 
// 0 BFC CERTIFY CCW
  [0,"BFC","CERTIFY"],
  [0,"BFC","CCW"],
// 
// 0 !CATEGORY Sticker Shortcut
// 0 !KEYWORDS Bricklink 4865pb007, BrickOwl 144596, Launch Command, Launch Evac 1
// 0 !KEYWORDS Set 6614, space port, town
// 
// 0 !PREVIEW 16 0 0 0 -1 0 0 0 1 0 0 0 -1
// 
// 0 !HISTORY 2025-04-27 [OrionP] Official Update 2025-04
// 
// 1 16 0 0 0 1 0 0 0 1 0 0 0 1 4865a.dat
  [1,16,0,0,0,1,0,0,0,1,0,0,0,1, ldraw_lib__4865a()],
// 1 16 0 12 10 1 0 0 0 0 -1 0 -1 0 169635a.dat
  [1,16,0,12,10,1,0,0,0,0,-1,0,-1,0, ldraw_lib__169635a()],
];
module ldraw_lib__4865ad0d(step=0, col=false, unit=2/5, alt=false, line=0.2, solid=!$preview)
    makepoly(ldraw_lib__4865ad0d(), step=step, col=col, unit=unit, alt=alt, line=line, solid=solid);
ldraw_lib__4865ad0d(line=0.2);
